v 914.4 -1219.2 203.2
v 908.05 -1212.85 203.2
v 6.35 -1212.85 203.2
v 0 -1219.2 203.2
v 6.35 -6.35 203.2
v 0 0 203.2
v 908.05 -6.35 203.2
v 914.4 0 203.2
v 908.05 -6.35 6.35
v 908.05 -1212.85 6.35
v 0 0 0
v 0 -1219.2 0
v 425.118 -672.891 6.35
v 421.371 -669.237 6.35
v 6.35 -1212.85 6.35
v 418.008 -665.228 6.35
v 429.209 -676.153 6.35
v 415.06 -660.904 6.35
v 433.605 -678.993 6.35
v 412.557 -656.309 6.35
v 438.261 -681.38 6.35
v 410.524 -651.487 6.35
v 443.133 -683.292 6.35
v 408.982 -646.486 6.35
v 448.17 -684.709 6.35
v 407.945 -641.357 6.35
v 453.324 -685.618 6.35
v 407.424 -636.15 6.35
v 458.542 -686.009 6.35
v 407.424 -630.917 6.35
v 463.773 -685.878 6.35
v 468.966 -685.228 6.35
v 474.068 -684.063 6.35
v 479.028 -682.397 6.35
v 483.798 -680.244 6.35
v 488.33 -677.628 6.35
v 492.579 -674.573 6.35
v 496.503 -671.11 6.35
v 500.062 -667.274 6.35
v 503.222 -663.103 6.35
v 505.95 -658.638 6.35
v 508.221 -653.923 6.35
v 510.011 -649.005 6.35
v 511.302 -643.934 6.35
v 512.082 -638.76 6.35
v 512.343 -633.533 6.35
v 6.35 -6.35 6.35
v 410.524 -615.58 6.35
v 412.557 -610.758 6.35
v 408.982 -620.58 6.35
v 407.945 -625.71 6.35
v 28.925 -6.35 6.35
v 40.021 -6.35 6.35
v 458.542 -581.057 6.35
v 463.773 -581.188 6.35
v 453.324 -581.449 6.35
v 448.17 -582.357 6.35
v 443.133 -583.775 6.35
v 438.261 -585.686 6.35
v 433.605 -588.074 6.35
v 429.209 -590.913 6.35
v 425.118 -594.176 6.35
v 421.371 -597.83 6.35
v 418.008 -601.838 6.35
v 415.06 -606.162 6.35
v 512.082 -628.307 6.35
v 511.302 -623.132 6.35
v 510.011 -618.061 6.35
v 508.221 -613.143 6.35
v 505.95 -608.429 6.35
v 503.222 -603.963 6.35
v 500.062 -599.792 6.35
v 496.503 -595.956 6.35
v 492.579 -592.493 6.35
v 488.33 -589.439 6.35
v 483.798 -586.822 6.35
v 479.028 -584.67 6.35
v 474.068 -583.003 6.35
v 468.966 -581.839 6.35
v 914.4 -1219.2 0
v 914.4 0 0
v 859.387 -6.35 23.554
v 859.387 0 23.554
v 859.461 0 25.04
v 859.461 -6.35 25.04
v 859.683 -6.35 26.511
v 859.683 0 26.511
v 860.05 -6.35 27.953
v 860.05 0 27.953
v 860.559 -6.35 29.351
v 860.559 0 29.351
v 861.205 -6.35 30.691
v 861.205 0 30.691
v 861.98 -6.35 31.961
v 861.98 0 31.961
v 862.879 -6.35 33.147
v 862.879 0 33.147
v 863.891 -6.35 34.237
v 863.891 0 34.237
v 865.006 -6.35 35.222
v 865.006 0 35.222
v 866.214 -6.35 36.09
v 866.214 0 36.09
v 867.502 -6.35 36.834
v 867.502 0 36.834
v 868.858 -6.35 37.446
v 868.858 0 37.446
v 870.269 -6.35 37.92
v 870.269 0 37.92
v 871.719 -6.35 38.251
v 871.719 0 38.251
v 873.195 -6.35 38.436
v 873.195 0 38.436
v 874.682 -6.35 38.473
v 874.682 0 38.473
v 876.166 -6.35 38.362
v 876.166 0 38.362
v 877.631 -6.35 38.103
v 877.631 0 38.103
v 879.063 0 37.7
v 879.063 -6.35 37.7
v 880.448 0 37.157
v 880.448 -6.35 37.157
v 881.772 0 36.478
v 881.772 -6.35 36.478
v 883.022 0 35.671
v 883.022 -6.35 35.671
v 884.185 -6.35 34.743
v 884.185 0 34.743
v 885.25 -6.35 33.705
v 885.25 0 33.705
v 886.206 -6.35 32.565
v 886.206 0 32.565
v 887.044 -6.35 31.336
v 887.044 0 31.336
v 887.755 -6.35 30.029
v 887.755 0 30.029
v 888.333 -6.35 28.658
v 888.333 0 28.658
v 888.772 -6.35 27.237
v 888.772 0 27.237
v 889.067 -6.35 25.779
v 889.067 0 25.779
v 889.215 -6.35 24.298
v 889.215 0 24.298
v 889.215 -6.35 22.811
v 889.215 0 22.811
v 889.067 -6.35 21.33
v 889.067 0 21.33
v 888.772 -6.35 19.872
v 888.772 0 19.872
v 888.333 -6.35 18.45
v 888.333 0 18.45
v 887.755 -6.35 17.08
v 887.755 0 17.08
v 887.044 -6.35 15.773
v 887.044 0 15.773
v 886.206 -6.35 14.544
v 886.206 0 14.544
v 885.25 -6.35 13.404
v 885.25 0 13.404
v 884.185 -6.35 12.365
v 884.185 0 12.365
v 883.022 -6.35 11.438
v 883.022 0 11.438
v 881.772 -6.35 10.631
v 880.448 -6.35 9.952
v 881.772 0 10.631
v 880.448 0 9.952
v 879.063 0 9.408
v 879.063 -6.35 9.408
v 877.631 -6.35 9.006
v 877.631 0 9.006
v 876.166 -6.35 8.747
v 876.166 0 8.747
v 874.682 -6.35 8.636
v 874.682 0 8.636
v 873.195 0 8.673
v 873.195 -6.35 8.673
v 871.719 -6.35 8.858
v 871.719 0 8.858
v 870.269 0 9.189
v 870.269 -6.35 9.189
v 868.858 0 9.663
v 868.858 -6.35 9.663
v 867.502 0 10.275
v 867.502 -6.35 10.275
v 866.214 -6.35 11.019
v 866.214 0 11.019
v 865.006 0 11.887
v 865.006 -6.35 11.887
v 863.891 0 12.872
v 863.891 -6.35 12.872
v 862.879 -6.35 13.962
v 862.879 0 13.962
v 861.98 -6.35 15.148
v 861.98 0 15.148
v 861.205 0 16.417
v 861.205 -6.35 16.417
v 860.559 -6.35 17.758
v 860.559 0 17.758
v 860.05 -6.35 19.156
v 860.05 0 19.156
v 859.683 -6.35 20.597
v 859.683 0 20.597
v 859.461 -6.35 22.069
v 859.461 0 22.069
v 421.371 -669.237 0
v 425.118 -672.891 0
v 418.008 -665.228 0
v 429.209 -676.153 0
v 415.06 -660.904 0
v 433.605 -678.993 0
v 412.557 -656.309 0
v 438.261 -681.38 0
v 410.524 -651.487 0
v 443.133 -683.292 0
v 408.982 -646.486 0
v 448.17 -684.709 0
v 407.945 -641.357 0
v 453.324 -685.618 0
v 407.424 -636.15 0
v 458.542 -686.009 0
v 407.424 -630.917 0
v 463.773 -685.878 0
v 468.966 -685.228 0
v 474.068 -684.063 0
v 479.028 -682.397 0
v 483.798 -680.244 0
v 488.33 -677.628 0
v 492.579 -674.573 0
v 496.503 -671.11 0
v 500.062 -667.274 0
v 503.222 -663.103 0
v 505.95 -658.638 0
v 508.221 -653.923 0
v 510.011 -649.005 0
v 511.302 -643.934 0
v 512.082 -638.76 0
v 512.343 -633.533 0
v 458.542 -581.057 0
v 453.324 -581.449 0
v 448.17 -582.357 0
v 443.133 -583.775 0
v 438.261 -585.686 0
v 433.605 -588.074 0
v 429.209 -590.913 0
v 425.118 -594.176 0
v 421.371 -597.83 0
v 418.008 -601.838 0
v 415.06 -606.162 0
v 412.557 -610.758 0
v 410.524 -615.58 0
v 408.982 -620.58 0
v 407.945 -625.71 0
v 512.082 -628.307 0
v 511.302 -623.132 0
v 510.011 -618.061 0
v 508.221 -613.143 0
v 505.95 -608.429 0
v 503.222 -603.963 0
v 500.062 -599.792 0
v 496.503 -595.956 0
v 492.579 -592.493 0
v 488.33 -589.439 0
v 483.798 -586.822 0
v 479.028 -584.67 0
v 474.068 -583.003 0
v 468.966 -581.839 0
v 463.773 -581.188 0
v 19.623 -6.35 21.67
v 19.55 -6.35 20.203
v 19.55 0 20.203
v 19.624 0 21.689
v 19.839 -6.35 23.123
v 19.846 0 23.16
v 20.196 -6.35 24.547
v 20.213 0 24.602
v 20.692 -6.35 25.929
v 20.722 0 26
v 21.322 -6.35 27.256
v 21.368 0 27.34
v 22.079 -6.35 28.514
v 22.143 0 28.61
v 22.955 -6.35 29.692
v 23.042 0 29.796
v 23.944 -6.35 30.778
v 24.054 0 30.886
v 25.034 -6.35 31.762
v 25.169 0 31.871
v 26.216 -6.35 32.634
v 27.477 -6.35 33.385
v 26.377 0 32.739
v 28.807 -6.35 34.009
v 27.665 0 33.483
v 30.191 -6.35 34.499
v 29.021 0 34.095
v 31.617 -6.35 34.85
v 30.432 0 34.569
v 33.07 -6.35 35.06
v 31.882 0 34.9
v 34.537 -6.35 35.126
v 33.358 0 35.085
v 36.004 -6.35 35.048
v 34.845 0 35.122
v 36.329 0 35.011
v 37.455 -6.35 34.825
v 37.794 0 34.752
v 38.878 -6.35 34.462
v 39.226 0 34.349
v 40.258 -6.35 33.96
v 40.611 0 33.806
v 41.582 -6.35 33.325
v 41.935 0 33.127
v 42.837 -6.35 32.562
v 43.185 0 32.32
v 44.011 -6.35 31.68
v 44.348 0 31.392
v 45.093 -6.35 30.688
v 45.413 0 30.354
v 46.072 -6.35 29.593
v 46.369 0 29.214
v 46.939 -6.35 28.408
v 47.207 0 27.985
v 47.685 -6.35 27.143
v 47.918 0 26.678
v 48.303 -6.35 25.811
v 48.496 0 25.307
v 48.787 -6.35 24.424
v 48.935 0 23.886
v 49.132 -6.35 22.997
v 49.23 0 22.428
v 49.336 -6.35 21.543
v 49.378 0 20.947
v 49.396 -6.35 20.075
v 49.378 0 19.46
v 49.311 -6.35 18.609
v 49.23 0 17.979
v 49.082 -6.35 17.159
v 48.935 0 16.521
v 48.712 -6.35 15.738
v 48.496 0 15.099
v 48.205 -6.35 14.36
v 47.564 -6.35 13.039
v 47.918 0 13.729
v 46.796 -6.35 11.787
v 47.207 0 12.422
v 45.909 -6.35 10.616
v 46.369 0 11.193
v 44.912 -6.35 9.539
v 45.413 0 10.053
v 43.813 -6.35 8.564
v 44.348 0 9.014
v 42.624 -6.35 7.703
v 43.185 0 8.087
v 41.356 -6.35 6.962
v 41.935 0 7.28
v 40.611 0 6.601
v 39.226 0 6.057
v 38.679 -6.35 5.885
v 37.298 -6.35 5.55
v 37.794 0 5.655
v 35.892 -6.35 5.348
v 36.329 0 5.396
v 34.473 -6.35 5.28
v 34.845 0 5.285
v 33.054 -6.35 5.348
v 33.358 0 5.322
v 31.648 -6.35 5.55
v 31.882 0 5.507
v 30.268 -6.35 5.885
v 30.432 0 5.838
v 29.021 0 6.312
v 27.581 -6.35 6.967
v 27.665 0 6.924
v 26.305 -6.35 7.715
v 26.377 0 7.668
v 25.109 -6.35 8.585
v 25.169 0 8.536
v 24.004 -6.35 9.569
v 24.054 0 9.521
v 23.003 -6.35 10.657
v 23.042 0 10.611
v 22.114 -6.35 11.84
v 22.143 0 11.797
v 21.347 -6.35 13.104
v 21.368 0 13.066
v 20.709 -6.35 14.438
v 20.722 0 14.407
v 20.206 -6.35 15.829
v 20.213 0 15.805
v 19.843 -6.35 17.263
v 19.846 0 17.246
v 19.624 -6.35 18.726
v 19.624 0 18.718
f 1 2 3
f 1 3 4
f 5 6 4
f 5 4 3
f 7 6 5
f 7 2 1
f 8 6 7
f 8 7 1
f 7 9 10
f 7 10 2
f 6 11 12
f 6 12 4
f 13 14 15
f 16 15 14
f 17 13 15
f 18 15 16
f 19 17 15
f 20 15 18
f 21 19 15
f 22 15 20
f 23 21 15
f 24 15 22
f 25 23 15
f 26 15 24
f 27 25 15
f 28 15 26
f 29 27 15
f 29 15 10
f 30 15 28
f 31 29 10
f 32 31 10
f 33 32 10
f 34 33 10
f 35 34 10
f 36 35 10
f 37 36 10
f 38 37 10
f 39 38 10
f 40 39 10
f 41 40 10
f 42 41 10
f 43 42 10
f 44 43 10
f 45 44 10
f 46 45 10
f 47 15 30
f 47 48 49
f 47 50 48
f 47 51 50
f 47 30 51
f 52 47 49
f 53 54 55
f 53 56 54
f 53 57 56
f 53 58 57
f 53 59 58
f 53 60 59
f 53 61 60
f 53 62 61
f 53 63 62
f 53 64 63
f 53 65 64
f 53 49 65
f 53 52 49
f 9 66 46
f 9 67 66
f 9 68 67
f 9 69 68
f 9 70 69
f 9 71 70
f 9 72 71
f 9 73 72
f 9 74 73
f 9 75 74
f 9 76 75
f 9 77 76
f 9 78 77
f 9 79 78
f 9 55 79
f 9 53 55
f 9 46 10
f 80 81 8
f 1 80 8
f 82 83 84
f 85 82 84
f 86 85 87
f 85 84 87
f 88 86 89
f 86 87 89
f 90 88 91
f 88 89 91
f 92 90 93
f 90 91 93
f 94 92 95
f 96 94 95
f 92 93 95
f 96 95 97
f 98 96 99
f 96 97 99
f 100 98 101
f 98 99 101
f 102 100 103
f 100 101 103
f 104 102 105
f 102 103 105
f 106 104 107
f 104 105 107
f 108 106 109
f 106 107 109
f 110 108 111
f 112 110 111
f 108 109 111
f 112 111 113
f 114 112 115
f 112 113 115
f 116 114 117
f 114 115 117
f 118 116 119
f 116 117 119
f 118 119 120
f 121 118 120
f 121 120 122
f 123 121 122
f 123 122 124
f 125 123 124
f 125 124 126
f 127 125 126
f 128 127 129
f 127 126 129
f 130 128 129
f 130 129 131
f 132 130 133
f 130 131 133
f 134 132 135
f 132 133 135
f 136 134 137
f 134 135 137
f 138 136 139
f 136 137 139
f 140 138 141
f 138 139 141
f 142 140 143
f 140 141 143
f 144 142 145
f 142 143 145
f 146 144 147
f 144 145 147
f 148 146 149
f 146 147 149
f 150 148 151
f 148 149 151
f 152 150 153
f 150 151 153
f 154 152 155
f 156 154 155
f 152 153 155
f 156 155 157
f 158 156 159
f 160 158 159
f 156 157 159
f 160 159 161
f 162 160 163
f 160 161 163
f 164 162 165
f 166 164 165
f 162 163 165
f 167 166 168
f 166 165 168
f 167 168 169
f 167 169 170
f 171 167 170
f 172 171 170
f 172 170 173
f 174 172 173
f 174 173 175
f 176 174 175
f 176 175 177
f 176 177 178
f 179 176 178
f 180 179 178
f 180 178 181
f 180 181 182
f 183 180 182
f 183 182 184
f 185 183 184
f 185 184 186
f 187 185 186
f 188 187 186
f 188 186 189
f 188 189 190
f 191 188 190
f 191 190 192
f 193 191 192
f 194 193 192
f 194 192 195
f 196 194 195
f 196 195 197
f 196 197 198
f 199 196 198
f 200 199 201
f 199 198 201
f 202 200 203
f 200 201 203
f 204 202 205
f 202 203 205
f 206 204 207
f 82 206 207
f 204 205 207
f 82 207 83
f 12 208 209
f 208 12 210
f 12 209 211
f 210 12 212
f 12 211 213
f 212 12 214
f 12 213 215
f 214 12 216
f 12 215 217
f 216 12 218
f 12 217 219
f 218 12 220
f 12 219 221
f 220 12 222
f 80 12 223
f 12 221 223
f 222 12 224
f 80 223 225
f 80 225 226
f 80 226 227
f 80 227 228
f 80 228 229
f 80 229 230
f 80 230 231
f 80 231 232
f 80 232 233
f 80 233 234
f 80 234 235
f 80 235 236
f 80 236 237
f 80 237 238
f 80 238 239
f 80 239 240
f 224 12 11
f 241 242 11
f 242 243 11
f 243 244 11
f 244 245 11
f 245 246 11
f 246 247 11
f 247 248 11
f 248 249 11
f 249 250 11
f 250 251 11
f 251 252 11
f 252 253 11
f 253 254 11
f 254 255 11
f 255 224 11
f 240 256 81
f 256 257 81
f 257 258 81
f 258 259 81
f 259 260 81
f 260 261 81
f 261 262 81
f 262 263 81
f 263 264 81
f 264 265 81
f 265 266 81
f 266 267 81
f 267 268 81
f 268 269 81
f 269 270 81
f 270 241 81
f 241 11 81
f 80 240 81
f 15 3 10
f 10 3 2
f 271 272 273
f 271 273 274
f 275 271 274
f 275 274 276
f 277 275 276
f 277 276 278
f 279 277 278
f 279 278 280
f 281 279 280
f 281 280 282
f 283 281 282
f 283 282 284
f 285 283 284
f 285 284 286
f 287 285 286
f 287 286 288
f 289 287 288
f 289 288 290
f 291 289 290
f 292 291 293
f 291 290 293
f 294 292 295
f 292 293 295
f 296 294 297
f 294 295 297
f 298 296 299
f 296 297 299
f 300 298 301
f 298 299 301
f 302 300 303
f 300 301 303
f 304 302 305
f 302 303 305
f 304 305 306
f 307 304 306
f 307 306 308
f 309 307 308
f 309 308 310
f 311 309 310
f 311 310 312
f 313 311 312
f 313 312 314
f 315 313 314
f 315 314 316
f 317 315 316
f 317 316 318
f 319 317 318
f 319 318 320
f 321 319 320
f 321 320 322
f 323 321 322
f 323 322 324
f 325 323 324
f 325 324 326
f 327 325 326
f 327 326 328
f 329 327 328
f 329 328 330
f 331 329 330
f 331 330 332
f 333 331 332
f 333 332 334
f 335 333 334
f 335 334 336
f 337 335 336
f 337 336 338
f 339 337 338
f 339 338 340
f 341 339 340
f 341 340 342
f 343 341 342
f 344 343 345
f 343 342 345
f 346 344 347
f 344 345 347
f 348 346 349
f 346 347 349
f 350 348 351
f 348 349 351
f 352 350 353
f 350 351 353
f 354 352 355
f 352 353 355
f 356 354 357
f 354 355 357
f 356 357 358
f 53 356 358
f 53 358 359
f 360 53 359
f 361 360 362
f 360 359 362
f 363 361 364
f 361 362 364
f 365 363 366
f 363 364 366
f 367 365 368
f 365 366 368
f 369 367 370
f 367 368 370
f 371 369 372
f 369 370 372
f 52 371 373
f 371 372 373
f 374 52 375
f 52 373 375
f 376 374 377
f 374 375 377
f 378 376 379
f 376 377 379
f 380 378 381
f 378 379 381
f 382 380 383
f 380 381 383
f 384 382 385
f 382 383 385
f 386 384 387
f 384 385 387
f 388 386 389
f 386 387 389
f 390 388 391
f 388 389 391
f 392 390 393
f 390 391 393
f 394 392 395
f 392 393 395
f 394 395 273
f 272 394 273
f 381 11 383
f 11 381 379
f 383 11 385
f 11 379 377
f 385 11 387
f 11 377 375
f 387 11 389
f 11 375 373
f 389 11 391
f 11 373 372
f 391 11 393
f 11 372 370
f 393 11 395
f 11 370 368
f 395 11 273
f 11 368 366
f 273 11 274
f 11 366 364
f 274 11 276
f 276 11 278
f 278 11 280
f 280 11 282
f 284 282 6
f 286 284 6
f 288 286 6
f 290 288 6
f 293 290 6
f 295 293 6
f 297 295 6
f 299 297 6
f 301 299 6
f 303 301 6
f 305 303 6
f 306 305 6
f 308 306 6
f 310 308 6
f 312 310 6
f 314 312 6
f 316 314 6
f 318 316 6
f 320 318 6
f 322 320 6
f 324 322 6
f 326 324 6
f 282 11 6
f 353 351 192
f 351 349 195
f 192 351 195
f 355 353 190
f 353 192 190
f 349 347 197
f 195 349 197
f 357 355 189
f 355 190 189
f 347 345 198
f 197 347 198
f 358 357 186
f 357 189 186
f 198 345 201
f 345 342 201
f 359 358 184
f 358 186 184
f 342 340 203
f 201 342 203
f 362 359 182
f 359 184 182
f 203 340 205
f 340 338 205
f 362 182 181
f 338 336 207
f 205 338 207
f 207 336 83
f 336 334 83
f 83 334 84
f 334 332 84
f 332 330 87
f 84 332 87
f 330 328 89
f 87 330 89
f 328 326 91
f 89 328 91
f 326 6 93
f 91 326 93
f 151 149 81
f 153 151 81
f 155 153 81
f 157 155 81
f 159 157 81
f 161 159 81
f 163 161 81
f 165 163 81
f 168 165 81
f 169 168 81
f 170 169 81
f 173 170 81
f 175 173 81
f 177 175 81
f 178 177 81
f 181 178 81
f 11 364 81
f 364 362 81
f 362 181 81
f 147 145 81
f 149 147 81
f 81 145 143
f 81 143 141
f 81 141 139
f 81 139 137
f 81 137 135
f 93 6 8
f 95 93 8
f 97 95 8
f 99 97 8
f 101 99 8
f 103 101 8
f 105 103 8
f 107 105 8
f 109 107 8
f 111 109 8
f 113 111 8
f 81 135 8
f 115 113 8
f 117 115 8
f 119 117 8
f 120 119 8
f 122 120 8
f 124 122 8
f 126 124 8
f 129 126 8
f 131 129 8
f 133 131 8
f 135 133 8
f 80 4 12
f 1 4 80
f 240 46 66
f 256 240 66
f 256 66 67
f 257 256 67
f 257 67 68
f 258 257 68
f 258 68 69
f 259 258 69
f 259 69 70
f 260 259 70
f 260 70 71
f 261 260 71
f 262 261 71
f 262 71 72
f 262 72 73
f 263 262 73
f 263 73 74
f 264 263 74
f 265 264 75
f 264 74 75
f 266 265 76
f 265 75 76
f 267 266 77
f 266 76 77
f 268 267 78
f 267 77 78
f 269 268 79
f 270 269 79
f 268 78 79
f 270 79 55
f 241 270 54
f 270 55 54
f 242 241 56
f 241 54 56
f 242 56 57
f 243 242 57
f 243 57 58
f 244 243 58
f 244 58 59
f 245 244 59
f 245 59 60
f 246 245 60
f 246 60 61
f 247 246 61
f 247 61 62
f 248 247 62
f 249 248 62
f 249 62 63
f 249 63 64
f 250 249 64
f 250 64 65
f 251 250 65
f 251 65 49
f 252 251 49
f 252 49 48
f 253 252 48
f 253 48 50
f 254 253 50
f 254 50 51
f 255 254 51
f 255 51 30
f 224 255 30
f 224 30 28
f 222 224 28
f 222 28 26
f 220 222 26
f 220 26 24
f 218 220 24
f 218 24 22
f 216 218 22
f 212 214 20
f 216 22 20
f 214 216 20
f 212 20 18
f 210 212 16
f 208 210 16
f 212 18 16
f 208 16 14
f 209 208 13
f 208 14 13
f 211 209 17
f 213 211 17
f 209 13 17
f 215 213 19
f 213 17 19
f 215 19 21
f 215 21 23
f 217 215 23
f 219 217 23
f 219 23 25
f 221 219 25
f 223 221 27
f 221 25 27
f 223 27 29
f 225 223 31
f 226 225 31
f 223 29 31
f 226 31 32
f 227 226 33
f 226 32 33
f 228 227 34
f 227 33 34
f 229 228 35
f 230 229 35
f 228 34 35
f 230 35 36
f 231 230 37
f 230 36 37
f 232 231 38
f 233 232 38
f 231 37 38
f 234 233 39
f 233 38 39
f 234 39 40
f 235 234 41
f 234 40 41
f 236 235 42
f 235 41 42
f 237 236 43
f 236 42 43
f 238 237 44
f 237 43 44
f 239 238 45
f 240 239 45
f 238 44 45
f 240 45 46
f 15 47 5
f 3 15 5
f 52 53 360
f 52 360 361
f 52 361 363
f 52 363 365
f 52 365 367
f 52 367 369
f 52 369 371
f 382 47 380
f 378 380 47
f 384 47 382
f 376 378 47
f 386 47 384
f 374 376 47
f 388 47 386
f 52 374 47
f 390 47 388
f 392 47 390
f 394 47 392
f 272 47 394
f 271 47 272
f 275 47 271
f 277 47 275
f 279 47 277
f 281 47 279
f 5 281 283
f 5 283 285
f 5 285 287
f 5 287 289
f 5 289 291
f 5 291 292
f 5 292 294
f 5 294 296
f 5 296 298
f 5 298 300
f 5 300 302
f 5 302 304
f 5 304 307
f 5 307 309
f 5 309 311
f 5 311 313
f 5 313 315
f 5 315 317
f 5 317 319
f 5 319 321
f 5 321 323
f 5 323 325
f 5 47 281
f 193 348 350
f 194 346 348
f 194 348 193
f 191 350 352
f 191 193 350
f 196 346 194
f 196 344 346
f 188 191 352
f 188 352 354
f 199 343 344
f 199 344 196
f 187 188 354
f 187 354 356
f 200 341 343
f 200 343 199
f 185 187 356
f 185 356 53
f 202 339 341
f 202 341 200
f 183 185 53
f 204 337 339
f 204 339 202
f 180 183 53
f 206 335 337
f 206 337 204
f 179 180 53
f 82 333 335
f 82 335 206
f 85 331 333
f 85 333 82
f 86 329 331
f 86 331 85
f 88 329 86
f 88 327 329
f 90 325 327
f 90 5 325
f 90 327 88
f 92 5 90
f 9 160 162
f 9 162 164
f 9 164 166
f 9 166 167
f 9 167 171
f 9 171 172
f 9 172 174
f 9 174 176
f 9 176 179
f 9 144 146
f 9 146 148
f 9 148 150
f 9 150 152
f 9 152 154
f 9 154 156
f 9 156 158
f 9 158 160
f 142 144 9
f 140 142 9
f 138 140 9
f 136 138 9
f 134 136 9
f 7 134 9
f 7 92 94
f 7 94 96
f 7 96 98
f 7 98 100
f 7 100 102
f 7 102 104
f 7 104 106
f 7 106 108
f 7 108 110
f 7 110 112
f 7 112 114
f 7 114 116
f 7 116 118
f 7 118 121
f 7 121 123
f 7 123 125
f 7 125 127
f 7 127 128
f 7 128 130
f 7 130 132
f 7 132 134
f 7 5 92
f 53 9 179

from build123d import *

# Parameters (mm, degrees)
F0_W     = 914.4
F0_H     = 203.2
F1_DEPTH = 1219.2
F2_T     = -6.35
F3_R     = 14.923
F4_DEPTH = 6.35
F5_R     = 52.492005
F6_DEPTH = 6.351


with BuildPart() as f1:
    # F0 (on Front) → F1 (new body)
    with BuildSketch(Plane.XZ):
        with Locations((457.2, 101.6)):
            Rectangle(F0_W, F0_H)
    extrude(amount=F1_DEPTH)

    # F2
    f2_openings = [f1.faces().sort_by_distance(p)[0] for p in [
        (457.2, -609.6, 203.2),
    ]]
    offset(amount=F2_T, openings=f2_openings)

    # F3 (on face) → F4 (cut)
    with BuildSketch(Plane(origin=(0, 0, 0), x_dir=(-1, 0, 0), z_dir=(0, 1, 0))):
        with Locations((-874.310315, 23.554392)):
            Circle(F3_R)
        with Locations((-34.473307, 20.203399)):
            Circle(F3_R)
    extrude(amount=-F4_DEPTH, mode=Mode.SUBTRACT)

    # F5 (on face) → F6 (cut, through all)
    with BuildSketch(Plane.XY.offset(6.35)):
        with Locations((459.850729, -633.53318)):
            Circle(F5_R)
    extrude(amount=-F6_DEPTH, mode=Mode.SUBTRACT)


solid = f1.part
